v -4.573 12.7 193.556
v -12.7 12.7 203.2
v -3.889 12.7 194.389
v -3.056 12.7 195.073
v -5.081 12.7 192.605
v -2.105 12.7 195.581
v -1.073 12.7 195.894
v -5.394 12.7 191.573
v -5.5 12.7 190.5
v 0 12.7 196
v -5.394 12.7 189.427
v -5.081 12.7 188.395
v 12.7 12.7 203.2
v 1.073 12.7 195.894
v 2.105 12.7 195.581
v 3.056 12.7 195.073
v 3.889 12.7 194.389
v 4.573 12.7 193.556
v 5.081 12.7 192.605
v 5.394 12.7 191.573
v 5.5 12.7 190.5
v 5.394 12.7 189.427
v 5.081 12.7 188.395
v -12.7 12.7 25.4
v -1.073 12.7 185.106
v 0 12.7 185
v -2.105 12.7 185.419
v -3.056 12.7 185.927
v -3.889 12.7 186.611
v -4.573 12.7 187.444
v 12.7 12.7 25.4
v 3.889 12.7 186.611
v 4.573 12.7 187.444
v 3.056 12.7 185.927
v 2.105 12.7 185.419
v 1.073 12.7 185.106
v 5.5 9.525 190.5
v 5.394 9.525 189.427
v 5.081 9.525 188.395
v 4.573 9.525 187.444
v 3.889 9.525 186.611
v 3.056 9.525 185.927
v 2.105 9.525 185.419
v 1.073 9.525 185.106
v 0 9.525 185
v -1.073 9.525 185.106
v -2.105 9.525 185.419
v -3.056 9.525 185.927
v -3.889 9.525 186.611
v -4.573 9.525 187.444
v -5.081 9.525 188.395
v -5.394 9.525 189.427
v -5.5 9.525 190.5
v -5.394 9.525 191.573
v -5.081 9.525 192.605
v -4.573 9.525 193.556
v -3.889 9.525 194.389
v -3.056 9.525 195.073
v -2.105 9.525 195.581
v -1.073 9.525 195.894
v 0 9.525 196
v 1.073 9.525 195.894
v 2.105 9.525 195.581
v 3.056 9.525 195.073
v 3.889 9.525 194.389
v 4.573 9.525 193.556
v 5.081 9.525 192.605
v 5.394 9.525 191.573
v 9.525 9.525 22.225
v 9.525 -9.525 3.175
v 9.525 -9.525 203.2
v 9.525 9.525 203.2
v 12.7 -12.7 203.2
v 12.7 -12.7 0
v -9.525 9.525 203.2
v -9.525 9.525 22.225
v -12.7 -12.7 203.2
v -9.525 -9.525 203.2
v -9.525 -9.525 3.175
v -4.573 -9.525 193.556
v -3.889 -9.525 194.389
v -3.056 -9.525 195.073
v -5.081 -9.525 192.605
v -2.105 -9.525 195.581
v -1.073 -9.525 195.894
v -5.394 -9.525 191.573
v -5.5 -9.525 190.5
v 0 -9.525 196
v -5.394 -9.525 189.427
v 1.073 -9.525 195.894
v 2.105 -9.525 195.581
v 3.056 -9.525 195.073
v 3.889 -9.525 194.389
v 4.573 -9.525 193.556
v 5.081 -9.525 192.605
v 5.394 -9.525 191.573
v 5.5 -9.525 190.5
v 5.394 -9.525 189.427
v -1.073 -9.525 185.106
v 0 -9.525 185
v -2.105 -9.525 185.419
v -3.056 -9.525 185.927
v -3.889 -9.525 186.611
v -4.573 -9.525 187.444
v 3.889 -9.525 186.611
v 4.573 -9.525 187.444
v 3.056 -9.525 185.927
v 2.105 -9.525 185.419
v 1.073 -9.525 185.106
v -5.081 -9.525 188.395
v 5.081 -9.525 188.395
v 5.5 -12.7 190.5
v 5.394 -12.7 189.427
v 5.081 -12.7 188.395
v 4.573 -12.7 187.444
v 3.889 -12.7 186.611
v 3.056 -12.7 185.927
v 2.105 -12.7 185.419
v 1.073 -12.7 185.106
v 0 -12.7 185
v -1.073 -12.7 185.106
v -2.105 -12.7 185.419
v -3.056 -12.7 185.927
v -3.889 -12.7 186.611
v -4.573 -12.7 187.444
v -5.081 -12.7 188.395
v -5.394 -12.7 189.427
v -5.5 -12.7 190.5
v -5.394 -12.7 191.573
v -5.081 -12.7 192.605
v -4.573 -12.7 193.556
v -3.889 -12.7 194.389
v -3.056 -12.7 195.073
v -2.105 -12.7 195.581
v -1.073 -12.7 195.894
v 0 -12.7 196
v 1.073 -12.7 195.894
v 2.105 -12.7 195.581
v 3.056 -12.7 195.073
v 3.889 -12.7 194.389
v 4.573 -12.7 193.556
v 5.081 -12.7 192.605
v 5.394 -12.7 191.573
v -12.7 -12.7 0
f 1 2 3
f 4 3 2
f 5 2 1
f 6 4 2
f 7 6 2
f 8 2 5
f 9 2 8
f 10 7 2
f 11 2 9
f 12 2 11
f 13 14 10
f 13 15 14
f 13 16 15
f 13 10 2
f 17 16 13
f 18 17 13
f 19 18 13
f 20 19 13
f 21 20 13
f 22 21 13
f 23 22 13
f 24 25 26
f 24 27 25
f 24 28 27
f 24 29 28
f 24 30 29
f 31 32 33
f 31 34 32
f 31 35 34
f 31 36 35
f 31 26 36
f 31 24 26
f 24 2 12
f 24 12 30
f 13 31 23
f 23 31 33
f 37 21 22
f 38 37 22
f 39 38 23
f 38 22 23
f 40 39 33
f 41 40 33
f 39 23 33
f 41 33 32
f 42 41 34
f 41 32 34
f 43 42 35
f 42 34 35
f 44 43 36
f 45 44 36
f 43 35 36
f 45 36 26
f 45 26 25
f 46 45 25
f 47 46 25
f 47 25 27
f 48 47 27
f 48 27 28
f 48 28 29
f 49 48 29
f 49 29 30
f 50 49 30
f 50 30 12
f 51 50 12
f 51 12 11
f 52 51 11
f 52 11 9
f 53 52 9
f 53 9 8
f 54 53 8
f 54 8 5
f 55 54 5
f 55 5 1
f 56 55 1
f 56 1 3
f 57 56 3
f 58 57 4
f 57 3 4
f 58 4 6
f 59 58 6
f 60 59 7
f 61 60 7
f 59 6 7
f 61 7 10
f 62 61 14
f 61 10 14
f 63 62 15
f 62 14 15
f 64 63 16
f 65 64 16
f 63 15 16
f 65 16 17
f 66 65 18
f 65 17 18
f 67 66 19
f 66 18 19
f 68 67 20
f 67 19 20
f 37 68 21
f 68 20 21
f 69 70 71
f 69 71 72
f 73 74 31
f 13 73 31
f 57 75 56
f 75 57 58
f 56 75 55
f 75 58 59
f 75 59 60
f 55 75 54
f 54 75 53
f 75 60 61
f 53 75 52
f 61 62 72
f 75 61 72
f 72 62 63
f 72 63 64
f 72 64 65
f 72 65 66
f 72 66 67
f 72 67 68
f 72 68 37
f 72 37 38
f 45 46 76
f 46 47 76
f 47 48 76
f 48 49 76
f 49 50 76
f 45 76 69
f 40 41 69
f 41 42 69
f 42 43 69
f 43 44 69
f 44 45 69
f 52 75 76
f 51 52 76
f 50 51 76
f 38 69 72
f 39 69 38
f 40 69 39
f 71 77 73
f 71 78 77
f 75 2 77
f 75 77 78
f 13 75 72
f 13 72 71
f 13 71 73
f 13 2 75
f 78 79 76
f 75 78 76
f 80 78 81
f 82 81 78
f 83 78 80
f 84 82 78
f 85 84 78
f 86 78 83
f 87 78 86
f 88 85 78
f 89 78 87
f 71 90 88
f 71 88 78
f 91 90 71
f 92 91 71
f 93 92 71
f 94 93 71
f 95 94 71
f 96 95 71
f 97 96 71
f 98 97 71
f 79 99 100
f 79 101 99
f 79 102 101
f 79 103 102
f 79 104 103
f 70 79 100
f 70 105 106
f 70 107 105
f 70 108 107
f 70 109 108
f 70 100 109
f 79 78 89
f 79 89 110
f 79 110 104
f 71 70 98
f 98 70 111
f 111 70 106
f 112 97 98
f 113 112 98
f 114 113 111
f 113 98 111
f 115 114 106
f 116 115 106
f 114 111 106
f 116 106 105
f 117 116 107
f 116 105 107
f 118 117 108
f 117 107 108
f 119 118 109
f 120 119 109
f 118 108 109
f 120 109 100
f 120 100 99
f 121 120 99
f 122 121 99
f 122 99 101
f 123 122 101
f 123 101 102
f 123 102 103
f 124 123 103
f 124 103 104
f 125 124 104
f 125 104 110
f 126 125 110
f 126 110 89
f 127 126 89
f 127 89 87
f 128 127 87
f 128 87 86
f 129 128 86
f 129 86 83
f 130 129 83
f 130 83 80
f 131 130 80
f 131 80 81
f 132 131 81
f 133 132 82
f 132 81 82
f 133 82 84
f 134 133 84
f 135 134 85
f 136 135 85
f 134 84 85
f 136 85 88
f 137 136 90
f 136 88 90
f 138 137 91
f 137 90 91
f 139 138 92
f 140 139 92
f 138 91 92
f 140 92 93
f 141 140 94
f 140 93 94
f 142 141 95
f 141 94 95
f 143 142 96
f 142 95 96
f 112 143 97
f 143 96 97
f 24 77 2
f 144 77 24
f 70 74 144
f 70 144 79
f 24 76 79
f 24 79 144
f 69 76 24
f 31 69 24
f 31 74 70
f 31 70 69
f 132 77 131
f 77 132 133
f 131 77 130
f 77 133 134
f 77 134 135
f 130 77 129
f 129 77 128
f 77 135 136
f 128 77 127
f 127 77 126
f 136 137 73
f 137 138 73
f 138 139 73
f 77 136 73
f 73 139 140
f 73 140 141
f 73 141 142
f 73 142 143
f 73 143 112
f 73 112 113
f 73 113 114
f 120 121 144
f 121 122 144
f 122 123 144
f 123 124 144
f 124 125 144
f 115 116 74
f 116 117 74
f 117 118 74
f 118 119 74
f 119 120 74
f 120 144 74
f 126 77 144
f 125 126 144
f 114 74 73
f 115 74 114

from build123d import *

# Parameters (mm, degrees)
SKETCH1_W             = 25.4
SKETCH1_H             = 25.4
SKETCH1_W_2           = 19.05
SKETCH1_H_2           = 19.05
BOSS_EXTRUDE1_DEPTH   = 203.2
CUT_EXTRUDE1_DEPTH    = 206.174779152
M10_CLEARANCE_HOLE1_D = 11


with BuildPart() as part:
    # Sketch1 → Boss-Extrude1 (new body)
    with BuildSketch(Plane.XY):
        Rectangle(SKETCH1_W, SKETCH1_H)
        Rectangle(SKETCH1_W_2, SKETCH1_H_2, mode=Mode.SUBTRACT)
    extrude(amount=BOSS_EXTRUDE1_DEPTH)

    # Sketch2 → Cut-Extrude1 (cut, through all)
    with BuildSketch(Plane(origin=(12.7, 0, 0), x_dir=(0, 0, -1), z_dir=(1, 0, 0))):
        Polygon((0, 12.7), (0, -12.7), (-25.4, 12.7), align=None)
    extrude(amount=-CUT_EXTRUDE1_DEPTH, mode=Mode.SUBTRACT)

    # M10 Clearance Hole1 (through all)
    with Locations(Plane(origin=(0, -12.7, 0), x_dir=(-1, 0, 0), z_dir=(0, -1, 0))):
        with Locations((0, -190.5)):
            Hole(M10_CLEARANCE_HOLE1_D / 2)


solid = part.part
